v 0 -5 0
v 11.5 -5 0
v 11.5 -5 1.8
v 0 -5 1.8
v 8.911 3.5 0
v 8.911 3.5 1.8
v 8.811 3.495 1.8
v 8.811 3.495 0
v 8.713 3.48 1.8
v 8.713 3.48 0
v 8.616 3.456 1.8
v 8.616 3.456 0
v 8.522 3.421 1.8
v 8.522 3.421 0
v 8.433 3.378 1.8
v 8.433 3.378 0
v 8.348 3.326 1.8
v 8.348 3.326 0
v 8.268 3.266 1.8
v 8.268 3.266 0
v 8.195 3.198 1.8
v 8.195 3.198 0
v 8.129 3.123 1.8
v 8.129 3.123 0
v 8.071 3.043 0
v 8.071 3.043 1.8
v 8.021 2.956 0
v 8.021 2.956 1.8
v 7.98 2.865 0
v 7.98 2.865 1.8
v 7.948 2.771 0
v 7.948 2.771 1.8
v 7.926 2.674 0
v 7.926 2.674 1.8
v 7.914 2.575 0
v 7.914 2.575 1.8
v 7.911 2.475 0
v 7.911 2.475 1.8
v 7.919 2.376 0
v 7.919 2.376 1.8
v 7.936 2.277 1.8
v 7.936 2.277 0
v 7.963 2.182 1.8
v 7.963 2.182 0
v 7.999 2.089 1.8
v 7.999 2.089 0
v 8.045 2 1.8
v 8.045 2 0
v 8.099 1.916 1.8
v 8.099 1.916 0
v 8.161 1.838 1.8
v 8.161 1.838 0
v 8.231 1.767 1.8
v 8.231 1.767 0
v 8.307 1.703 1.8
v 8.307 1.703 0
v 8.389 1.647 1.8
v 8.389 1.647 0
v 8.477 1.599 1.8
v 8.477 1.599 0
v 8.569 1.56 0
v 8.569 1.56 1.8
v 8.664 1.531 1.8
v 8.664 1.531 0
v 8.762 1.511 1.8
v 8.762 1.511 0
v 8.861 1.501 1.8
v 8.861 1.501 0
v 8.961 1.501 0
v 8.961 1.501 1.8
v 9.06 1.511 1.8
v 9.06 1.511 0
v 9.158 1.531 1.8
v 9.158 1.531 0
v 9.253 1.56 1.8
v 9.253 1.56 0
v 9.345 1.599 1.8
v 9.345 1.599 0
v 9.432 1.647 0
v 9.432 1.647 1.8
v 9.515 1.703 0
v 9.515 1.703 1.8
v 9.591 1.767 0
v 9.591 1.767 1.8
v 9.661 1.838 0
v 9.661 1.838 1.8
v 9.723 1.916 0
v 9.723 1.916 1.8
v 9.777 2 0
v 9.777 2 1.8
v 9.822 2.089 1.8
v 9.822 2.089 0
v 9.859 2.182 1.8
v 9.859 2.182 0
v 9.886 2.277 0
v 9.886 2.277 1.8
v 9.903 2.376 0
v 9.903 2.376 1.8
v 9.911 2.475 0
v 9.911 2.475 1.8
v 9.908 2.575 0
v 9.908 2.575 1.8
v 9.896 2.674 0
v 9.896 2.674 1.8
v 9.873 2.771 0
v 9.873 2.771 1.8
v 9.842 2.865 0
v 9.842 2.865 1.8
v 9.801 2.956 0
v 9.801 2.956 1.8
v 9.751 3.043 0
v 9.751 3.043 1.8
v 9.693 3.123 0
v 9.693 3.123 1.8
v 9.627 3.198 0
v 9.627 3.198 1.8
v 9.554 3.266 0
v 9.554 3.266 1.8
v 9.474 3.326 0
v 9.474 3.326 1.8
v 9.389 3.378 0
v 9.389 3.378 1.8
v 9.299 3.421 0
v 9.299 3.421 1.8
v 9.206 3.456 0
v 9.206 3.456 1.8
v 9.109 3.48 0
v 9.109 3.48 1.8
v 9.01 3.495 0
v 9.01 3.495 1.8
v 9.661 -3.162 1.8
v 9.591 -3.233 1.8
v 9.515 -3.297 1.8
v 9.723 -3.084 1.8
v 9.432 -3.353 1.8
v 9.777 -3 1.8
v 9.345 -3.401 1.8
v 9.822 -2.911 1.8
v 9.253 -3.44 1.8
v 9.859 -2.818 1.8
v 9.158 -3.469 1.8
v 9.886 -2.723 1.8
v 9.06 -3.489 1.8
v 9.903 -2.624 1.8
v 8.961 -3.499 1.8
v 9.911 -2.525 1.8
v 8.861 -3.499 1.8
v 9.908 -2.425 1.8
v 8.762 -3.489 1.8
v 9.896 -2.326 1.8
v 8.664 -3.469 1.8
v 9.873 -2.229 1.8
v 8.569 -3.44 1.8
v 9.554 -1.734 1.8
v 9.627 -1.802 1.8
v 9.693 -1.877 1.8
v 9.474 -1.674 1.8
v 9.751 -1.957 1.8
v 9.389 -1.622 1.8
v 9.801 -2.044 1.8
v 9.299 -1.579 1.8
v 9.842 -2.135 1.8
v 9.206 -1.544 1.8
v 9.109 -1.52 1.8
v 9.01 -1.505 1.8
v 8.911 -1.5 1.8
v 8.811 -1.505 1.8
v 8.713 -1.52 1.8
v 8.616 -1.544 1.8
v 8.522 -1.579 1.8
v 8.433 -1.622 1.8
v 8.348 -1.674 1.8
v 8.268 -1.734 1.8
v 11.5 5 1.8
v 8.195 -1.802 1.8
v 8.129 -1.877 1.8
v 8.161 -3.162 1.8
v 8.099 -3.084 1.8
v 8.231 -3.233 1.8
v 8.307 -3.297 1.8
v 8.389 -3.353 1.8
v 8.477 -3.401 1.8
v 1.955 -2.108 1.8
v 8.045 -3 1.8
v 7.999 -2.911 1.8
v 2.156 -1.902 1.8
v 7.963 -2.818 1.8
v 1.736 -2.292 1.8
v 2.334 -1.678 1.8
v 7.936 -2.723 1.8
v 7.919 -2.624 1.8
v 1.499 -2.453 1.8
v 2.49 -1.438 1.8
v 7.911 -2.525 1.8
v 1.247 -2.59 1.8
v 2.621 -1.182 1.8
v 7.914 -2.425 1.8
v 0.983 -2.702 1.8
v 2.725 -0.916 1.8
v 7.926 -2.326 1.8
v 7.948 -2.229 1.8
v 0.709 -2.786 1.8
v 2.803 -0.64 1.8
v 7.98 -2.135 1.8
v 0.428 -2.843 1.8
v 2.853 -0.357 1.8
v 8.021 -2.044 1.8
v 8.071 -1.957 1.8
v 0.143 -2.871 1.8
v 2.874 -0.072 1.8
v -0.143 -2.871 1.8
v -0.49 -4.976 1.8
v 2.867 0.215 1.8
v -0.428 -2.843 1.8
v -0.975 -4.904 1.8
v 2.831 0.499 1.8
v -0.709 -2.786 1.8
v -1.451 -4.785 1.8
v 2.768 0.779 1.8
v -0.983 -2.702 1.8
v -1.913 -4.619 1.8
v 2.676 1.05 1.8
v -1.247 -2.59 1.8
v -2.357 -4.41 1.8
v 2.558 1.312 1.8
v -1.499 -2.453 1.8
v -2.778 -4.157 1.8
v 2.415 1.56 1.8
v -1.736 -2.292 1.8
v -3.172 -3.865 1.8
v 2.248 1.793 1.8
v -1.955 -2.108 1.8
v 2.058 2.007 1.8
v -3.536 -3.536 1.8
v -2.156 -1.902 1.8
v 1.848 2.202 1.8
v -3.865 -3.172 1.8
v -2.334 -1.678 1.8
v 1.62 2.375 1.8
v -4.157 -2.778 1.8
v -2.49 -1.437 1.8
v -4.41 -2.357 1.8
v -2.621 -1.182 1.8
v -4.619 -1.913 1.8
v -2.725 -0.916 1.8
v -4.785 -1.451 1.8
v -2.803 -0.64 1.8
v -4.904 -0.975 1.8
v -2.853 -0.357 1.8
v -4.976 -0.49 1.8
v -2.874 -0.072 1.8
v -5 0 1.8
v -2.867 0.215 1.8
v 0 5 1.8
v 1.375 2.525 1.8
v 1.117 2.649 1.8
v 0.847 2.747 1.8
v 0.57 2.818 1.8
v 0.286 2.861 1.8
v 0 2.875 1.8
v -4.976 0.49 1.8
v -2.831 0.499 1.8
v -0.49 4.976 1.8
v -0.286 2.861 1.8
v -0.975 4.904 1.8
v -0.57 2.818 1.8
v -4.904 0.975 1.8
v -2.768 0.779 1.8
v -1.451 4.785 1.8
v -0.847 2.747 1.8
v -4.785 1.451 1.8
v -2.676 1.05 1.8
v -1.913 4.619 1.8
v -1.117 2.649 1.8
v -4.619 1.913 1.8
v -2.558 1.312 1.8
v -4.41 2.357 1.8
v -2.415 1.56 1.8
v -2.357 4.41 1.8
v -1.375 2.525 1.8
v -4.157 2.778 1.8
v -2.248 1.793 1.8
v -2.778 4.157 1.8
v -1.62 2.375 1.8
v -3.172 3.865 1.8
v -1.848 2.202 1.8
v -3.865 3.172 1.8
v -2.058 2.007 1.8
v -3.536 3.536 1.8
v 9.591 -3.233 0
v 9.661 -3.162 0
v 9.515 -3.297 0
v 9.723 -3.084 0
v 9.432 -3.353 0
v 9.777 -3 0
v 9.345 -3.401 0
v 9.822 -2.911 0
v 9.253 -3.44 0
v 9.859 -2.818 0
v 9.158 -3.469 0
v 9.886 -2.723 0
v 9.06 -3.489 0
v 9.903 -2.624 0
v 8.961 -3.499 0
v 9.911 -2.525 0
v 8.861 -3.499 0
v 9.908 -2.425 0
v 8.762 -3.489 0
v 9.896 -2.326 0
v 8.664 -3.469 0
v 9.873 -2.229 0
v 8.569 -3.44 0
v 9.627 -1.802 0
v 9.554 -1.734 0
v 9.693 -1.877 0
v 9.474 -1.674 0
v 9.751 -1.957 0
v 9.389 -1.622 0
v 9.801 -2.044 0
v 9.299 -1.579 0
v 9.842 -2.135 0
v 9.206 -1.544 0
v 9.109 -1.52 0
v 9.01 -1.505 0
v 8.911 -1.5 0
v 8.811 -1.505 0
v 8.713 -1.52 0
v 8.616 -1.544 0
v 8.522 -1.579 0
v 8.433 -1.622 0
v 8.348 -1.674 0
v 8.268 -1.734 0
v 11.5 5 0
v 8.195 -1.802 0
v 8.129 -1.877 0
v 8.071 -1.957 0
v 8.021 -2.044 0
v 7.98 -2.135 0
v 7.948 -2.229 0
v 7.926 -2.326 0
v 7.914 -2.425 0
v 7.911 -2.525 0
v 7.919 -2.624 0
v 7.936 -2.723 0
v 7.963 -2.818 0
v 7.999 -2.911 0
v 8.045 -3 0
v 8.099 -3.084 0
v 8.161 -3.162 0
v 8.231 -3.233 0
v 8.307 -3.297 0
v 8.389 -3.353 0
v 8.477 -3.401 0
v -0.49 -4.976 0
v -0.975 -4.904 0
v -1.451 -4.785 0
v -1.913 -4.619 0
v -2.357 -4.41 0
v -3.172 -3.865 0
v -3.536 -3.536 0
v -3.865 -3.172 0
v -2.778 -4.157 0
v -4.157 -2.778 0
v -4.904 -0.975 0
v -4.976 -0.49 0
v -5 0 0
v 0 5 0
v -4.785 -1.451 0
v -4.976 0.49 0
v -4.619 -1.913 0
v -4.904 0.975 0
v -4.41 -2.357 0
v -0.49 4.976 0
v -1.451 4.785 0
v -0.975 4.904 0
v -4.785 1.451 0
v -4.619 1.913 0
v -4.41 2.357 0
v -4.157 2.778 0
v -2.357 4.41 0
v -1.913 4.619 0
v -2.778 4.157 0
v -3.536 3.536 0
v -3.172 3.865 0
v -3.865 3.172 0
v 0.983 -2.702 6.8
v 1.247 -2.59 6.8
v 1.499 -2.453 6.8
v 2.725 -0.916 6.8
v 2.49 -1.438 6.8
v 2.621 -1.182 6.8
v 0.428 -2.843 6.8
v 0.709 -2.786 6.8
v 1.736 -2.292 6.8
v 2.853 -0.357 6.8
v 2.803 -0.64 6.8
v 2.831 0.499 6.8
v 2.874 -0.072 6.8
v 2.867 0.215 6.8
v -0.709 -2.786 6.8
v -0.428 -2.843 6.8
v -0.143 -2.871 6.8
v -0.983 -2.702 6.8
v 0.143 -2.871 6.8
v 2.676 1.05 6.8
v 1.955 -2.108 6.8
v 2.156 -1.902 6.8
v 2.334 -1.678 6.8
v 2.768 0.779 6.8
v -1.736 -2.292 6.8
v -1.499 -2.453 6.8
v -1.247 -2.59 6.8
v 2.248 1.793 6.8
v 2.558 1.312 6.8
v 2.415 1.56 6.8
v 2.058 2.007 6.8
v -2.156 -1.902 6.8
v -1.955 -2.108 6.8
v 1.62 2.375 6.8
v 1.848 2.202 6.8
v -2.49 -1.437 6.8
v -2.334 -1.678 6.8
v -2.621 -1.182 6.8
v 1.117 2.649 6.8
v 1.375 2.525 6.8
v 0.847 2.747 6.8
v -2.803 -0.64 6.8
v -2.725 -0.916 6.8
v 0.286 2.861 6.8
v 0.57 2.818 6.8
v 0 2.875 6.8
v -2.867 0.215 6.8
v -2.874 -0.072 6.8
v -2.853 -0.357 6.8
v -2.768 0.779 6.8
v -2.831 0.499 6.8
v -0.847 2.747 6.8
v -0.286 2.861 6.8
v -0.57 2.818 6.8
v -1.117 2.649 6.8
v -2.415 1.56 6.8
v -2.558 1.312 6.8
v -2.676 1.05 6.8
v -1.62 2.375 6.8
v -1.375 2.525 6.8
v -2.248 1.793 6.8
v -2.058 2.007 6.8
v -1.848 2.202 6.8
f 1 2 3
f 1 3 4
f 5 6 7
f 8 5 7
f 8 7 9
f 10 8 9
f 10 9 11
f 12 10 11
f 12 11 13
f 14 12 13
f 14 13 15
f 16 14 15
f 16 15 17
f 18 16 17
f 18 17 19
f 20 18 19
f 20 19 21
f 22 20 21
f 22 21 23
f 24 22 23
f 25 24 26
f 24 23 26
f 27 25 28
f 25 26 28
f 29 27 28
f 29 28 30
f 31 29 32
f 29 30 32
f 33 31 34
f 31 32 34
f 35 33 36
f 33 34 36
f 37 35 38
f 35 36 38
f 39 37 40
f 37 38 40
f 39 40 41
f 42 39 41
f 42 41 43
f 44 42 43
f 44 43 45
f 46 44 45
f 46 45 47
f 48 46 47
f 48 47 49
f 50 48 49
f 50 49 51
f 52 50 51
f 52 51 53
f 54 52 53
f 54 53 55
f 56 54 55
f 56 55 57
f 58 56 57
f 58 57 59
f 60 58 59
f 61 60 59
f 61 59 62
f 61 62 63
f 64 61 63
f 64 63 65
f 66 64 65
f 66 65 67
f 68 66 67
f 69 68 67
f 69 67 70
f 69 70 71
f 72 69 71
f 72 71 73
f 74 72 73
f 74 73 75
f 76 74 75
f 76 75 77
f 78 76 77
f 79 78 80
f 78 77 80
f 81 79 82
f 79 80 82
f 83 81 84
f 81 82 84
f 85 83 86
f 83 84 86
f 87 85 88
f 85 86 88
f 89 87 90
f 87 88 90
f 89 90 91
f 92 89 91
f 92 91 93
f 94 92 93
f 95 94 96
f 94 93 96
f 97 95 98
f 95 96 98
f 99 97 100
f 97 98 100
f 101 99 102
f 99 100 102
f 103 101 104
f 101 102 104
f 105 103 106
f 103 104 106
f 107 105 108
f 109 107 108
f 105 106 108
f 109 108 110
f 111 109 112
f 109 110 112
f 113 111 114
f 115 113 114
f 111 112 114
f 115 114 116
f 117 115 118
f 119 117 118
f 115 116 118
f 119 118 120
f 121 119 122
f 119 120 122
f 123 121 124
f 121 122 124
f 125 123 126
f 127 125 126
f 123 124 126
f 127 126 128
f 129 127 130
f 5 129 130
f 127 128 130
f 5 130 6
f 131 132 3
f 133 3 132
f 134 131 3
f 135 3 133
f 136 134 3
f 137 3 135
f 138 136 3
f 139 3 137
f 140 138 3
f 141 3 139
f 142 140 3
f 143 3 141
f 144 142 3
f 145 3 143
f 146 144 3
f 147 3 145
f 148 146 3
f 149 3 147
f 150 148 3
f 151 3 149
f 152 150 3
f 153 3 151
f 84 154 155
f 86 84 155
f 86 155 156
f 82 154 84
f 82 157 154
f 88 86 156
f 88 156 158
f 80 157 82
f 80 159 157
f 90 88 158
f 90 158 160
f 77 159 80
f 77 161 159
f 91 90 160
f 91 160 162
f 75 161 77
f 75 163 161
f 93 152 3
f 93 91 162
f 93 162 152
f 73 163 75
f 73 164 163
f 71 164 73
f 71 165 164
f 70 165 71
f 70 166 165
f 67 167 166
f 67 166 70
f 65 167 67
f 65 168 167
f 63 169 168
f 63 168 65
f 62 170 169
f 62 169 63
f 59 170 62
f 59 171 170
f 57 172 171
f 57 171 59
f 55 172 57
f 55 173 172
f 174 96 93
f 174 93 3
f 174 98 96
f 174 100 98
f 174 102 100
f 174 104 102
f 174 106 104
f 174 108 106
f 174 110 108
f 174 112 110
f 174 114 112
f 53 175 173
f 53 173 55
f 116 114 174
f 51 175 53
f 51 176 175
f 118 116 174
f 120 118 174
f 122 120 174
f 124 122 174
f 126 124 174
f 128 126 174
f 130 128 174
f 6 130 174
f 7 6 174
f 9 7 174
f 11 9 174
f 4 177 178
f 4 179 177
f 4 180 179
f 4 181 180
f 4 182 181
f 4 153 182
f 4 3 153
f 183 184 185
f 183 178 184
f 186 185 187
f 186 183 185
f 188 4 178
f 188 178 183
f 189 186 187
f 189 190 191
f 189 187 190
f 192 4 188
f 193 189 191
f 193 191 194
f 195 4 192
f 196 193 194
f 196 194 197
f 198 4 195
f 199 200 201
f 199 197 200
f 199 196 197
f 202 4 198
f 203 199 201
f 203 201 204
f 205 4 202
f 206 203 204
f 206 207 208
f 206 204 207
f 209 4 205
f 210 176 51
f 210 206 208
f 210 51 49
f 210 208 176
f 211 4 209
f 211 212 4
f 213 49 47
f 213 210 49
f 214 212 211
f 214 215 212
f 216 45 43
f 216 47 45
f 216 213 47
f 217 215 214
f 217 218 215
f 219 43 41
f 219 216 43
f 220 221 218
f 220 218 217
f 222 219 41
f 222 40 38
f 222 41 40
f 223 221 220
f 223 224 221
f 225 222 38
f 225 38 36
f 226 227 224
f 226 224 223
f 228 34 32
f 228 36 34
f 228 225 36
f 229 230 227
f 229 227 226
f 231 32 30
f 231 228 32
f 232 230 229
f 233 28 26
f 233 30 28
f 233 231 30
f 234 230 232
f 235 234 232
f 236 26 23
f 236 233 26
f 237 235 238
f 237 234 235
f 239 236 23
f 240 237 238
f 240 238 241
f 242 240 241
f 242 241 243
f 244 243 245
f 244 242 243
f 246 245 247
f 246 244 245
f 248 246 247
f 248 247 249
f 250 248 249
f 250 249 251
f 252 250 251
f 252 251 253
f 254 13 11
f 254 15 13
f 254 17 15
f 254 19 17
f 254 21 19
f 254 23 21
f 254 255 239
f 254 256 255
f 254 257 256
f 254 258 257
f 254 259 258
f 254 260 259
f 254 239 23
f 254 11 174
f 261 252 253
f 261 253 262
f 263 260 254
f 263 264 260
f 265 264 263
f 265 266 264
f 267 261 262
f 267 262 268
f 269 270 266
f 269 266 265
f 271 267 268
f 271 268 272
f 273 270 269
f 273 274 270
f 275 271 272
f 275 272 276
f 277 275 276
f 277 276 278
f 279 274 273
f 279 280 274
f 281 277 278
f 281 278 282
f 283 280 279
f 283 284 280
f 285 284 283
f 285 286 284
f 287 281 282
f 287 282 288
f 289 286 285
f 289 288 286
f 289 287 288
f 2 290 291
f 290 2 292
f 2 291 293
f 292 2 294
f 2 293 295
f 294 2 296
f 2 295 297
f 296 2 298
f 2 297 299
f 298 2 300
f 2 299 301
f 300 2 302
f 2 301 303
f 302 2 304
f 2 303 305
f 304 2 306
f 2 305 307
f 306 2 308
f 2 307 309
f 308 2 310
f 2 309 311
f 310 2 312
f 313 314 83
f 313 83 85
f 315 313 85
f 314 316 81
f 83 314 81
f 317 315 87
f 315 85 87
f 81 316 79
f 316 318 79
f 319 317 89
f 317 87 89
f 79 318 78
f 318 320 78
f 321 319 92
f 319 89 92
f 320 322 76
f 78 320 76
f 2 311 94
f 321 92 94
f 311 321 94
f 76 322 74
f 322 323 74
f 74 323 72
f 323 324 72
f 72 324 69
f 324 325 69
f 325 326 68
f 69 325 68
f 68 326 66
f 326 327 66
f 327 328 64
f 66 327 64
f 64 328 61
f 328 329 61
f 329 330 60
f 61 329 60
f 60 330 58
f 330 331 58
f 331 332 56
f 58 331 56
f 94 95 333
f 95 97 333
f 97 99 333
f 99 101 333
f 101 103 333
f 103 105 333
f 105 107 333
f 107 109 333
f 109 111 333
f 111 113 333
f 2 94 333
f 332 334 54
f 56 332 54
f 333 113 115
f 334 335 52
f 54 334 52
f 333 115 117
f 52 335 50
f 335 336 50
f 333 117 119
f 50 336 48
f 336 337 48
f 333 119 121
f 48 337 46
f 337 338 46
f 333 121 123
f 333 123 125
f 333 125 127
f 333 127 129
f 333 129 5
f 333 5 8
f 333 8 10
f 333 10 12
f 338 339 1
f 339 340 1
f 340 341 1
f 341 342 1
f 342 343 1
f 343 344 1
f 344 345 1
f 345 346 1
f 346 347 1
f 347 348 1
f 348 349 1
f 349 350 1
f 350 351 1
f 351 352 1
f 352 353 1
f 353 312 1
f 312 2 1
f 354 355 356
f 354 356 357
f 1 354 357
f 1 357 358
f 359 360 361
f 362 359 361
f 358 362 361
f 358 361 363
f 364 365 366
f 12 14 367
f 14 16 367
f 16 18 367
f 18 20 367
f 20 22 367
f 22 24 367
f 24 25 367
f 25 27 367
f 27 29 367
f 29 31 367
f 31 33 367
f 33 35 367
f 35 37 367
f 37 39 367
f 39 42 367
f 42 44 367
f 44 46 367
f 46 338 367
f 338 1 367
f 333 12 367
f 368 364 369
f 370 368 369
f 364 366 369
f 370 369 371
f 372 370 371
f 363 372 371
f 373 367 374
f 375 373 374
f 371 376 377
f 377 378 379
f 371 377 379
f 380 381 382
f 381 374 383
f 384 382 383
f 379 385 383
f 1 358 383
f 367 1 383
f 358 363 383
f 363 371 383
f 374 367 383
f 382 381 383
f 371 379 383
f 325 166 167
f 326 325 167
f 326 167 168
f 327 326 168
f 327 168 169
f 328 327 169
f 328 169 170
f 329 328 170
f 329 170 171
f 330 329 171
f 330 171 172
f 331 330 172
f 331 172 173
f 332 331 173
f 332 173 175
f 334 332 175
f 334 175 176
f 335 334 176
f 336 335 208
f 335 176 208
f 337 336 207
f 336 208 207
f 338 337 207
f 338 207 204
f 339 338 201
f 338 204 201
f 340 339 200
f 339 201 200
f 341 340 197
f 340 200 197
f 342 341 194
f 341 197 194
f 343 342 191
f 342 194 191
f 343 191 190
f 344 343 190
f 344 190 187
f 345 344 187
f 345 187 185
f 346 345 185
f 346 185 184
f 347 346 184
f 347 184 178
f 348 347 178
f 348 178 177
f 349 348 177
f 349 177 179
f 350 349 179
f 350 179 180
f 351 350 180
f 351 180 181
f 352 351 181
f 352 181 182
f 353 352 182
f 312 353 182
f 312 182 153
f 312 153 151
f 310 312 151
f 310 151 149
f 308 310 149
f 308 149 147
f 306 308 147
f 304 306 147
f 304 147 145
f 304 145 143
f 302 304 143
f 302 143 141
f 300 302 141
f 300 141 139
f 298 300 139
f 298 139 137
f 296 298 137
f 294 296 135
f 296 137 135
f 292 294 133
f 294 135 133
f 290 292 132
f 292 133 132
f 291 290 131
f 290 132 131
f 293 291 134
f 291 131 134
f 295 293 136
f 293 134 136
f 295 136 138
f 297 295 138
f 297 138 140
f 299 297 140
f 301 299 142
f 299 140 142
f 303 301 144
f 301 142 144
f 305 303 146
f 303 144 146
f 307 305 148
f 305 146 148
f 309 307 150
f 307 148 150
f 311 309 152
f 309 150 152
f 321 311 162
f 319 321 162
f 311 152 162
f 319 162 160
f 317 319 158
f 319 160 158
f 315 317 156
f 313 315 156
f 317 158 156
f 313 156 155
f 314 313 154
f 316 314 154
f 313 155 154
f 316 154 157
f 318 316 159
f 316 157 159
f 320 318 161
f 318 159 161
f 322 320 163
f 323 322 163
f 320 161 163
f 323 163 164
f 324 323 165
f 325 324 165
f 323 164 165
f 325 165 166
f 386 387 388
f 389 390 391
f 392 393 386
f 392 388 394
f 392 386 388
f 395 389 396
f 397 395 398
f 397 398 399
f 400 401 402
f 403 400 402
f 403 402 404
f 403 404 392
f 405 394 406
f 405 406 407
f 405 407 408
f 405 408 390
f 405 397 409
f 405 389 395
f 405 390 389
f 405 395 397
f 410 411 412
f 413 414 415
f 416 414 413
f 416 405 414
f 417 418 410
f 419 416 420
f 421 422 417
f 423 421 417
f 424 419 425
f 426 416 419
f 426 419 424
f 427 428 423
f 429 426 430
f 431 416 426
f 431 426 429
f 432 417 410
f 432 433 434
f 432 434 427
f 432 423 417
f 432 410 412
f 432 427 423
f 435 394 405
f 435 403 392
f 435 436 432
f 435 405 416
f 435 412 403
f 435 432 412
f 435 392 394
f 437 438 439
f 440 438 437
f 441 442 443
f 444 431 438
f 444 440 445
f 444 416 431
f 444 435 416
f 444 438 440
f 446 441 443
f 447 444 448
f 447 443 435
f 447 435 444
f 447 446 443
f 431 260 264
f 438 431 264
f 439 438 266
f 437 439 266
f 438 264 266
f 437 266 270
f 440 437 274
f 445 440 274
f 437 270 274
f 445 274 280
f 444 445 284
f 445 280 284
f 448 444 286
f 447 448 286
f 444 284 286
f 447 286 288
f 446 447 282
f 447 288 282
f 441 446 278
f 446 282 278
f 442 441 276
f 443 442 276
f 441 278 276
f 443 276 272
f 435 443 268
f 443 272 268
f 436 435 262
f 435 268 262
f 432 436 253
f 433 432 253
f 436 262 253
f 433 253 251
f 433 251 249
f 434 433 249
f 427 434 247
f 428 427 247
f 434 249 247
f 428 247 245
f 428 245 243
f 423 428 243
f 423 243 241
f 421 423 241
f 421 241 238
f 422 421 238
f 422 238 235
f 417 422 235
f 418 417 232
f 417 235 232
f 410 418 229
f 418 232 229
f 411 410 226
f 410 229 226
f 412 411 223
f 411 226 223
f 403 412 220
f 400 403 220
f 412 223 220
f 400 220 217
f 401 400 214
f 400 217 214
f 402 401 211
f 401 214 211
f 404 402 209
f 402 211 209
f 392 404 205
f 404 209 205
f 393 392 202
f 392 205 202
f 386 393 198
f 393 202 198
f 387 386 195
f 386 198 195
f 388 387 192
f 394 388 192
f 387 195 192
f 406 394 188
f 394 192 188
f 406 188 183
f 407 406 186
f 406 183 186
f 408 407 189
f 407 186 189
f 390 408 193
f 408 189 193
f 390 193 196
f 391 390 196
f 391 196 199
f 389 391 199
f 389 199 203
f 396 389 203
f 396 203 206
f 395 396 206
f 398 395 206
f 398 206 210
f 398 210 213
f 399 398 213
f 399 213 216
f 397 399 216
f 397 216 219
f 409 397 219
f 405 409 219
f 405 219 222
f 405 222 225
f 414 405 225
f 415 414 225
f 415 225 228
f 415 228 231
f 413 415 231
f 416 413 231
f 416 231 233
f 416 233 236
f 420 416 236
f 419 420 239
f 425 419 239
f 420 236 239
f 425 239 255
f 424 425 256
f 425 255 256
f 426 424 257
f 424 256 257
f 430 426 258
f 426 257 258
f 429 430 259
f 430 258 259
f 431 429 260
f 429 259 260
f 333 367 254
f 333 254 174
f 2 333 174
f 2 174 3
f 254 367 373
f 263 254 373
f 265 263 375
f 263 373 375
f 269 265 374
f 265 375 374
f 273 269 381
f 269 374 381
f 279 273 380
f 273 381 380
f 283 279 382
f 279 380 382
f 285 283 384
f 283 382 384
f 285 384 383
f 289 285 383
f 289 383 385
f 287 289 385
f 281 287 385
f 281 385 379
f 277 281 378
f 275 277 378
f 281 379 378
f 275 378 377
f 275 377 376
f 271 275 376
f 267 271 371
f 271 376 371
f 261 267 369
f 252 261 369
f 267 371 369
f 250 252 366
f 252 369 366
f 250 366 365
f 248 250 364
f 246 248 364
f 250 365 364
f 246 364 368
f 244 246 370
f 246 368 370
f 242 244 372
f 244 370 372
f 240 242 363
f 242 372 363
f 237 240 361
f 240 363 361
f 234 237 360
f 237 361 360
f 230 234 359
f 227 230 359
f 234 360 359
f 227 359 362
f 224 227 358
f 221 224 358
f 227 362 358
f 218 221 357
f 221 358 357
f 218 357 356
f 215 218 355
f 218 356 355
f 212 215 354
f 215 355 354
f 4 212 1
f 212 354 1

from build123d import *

# Parameters (mm, degrees)
PAD_DEPTH            = 1.8
SKETCH004_R          = 2.875
PAD001_DEPTH         = 5
SKETCH005_R          = 1
POCKET_DEPTH         = 1.801
BODY_PLACEMENT_ANGLE = 90


with BuildPart() as part:
    # Sketch → Pad (new body)
    with BuildSketch(Plane.XY):
        with BuildLine():
            ThreePointArc((5, 0), (0, 5), (-5, 0))
            Line((-5, -11.5), (-5, 0))
            Line((5, -11.5), (-5, -11.5))
            Line((5, 0), (5, -11.5))
        make_face()
    extrude(amount=PAD_DEPTH)

    # Sketch004 (on Face6 of Pad) → Pad001 (join)
    with BuildSketch(Plane.XY.offset(1.8)):
        Circle(SKETCH004_R)
    extrude(amount=PAD001_DEPTH)

    # Sketch005 (on Face5 of Pad001) → Pocket (cut, through all)
    with BuildSketch(Plane.XY.offset(1.8)):
        with Locations((-2.5, -8.910861)):
            Circle(SKETCH005_R)
        with Locations((2.5, -8.910861)):
            Circle(SKETCH005_R)
    extrude(amount=-POCKET_DEPTH, mode=Mode.SUBTRACT)


with BuildPart() as part_1:
    # Body placement: moved
    add(part.part.rotate(Axis((0, 0, 0), (0, 0, 1)), BODY_PLACEMENT_ANGLE))


solid = part_1.part
